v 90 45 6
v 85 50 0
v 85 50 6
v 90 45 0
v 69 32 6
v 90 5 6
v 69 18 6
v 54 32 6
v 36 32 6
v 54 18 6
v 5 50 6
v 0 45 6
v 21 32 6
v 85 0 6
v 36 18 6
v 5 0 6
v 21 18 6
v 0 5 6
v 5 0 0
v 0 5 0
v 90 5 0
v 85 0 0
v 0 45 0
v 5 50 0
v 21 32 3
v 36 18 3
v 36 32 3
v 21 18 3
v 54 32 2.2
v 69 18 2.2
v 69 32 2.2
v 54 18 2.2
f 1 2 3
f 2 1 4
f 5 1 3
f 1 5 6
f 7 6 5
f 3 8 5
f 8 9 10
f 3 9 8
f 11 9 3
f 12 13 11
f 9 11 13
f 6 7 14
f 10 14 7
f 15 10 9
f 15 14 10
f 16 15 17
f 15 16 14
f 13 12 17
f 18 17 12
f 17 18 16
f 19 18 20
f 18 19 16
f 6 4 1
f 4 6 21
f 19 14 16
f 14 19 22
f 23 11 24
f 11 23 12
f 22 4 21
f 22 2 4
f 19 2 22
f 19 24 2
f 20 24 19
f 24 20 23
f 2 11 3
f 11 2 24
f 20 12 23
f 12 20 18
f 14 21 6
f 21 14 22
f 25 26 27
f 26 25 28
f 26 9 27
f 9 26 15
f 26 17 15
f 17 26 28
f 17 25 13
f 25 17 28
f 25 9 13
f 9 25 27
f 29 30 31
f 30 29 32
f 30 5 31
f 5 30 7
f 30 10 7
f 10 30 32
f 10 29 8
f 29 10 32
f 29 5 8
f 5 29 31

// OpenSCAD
$fn = 32;

// ----------------------------------------------------------------------
// Windowed plate: 2 voids, 90 x 50 x 6 mm
// ----------------------------------------------------------------------

// --- parameters (mm) ---
plate_l = 90;             // plate length, X
plate_w = 50;             // plate width, Y
plate_t = 6;              // plate thickness, Z
edge_margin = 12;         // wall from the plate edge to any window
windows = 2;              // number of windows in the row
win_l = 15;               // window length
win_w = 14;               // window width
win_pitch = 33;           // window pitch along X
depth_1 = 3;              // depth of void 1 (full thickness = through)
depth_2 = 3.8;            // depth of void 2 (full thickness = through)
corner_c = 5;             // corner chamfer of the plate

profile = [[5, 0], [85, 0], [90, 5], [90, 45], [85, 50], [5, 50], [0, 45], [0, 5]];  // primary outline, 8 points, counter clockwise
void_1 = [[21, 18], [36, 18], [36, 32], [21, 32]];  // window 1 of the row, 4 points
void_2 = [[54, 18], [69, 18], [69, 32], [54, 32]];  // window 2 of the row, 4 points

// --- the one profile operation ---
difference() {
  linear_extrude(height = plate_t) polygon(points = profile);
  translate([0, 0, plate_t - depth_1])
    linear_extrude(height = depth_1 + 1) polygon(points = void_1);
  translate([0, 0, plate_t - depth_2])
    linear_extrude(height = depth_2 + 1) polygon(points = void_2);
}
